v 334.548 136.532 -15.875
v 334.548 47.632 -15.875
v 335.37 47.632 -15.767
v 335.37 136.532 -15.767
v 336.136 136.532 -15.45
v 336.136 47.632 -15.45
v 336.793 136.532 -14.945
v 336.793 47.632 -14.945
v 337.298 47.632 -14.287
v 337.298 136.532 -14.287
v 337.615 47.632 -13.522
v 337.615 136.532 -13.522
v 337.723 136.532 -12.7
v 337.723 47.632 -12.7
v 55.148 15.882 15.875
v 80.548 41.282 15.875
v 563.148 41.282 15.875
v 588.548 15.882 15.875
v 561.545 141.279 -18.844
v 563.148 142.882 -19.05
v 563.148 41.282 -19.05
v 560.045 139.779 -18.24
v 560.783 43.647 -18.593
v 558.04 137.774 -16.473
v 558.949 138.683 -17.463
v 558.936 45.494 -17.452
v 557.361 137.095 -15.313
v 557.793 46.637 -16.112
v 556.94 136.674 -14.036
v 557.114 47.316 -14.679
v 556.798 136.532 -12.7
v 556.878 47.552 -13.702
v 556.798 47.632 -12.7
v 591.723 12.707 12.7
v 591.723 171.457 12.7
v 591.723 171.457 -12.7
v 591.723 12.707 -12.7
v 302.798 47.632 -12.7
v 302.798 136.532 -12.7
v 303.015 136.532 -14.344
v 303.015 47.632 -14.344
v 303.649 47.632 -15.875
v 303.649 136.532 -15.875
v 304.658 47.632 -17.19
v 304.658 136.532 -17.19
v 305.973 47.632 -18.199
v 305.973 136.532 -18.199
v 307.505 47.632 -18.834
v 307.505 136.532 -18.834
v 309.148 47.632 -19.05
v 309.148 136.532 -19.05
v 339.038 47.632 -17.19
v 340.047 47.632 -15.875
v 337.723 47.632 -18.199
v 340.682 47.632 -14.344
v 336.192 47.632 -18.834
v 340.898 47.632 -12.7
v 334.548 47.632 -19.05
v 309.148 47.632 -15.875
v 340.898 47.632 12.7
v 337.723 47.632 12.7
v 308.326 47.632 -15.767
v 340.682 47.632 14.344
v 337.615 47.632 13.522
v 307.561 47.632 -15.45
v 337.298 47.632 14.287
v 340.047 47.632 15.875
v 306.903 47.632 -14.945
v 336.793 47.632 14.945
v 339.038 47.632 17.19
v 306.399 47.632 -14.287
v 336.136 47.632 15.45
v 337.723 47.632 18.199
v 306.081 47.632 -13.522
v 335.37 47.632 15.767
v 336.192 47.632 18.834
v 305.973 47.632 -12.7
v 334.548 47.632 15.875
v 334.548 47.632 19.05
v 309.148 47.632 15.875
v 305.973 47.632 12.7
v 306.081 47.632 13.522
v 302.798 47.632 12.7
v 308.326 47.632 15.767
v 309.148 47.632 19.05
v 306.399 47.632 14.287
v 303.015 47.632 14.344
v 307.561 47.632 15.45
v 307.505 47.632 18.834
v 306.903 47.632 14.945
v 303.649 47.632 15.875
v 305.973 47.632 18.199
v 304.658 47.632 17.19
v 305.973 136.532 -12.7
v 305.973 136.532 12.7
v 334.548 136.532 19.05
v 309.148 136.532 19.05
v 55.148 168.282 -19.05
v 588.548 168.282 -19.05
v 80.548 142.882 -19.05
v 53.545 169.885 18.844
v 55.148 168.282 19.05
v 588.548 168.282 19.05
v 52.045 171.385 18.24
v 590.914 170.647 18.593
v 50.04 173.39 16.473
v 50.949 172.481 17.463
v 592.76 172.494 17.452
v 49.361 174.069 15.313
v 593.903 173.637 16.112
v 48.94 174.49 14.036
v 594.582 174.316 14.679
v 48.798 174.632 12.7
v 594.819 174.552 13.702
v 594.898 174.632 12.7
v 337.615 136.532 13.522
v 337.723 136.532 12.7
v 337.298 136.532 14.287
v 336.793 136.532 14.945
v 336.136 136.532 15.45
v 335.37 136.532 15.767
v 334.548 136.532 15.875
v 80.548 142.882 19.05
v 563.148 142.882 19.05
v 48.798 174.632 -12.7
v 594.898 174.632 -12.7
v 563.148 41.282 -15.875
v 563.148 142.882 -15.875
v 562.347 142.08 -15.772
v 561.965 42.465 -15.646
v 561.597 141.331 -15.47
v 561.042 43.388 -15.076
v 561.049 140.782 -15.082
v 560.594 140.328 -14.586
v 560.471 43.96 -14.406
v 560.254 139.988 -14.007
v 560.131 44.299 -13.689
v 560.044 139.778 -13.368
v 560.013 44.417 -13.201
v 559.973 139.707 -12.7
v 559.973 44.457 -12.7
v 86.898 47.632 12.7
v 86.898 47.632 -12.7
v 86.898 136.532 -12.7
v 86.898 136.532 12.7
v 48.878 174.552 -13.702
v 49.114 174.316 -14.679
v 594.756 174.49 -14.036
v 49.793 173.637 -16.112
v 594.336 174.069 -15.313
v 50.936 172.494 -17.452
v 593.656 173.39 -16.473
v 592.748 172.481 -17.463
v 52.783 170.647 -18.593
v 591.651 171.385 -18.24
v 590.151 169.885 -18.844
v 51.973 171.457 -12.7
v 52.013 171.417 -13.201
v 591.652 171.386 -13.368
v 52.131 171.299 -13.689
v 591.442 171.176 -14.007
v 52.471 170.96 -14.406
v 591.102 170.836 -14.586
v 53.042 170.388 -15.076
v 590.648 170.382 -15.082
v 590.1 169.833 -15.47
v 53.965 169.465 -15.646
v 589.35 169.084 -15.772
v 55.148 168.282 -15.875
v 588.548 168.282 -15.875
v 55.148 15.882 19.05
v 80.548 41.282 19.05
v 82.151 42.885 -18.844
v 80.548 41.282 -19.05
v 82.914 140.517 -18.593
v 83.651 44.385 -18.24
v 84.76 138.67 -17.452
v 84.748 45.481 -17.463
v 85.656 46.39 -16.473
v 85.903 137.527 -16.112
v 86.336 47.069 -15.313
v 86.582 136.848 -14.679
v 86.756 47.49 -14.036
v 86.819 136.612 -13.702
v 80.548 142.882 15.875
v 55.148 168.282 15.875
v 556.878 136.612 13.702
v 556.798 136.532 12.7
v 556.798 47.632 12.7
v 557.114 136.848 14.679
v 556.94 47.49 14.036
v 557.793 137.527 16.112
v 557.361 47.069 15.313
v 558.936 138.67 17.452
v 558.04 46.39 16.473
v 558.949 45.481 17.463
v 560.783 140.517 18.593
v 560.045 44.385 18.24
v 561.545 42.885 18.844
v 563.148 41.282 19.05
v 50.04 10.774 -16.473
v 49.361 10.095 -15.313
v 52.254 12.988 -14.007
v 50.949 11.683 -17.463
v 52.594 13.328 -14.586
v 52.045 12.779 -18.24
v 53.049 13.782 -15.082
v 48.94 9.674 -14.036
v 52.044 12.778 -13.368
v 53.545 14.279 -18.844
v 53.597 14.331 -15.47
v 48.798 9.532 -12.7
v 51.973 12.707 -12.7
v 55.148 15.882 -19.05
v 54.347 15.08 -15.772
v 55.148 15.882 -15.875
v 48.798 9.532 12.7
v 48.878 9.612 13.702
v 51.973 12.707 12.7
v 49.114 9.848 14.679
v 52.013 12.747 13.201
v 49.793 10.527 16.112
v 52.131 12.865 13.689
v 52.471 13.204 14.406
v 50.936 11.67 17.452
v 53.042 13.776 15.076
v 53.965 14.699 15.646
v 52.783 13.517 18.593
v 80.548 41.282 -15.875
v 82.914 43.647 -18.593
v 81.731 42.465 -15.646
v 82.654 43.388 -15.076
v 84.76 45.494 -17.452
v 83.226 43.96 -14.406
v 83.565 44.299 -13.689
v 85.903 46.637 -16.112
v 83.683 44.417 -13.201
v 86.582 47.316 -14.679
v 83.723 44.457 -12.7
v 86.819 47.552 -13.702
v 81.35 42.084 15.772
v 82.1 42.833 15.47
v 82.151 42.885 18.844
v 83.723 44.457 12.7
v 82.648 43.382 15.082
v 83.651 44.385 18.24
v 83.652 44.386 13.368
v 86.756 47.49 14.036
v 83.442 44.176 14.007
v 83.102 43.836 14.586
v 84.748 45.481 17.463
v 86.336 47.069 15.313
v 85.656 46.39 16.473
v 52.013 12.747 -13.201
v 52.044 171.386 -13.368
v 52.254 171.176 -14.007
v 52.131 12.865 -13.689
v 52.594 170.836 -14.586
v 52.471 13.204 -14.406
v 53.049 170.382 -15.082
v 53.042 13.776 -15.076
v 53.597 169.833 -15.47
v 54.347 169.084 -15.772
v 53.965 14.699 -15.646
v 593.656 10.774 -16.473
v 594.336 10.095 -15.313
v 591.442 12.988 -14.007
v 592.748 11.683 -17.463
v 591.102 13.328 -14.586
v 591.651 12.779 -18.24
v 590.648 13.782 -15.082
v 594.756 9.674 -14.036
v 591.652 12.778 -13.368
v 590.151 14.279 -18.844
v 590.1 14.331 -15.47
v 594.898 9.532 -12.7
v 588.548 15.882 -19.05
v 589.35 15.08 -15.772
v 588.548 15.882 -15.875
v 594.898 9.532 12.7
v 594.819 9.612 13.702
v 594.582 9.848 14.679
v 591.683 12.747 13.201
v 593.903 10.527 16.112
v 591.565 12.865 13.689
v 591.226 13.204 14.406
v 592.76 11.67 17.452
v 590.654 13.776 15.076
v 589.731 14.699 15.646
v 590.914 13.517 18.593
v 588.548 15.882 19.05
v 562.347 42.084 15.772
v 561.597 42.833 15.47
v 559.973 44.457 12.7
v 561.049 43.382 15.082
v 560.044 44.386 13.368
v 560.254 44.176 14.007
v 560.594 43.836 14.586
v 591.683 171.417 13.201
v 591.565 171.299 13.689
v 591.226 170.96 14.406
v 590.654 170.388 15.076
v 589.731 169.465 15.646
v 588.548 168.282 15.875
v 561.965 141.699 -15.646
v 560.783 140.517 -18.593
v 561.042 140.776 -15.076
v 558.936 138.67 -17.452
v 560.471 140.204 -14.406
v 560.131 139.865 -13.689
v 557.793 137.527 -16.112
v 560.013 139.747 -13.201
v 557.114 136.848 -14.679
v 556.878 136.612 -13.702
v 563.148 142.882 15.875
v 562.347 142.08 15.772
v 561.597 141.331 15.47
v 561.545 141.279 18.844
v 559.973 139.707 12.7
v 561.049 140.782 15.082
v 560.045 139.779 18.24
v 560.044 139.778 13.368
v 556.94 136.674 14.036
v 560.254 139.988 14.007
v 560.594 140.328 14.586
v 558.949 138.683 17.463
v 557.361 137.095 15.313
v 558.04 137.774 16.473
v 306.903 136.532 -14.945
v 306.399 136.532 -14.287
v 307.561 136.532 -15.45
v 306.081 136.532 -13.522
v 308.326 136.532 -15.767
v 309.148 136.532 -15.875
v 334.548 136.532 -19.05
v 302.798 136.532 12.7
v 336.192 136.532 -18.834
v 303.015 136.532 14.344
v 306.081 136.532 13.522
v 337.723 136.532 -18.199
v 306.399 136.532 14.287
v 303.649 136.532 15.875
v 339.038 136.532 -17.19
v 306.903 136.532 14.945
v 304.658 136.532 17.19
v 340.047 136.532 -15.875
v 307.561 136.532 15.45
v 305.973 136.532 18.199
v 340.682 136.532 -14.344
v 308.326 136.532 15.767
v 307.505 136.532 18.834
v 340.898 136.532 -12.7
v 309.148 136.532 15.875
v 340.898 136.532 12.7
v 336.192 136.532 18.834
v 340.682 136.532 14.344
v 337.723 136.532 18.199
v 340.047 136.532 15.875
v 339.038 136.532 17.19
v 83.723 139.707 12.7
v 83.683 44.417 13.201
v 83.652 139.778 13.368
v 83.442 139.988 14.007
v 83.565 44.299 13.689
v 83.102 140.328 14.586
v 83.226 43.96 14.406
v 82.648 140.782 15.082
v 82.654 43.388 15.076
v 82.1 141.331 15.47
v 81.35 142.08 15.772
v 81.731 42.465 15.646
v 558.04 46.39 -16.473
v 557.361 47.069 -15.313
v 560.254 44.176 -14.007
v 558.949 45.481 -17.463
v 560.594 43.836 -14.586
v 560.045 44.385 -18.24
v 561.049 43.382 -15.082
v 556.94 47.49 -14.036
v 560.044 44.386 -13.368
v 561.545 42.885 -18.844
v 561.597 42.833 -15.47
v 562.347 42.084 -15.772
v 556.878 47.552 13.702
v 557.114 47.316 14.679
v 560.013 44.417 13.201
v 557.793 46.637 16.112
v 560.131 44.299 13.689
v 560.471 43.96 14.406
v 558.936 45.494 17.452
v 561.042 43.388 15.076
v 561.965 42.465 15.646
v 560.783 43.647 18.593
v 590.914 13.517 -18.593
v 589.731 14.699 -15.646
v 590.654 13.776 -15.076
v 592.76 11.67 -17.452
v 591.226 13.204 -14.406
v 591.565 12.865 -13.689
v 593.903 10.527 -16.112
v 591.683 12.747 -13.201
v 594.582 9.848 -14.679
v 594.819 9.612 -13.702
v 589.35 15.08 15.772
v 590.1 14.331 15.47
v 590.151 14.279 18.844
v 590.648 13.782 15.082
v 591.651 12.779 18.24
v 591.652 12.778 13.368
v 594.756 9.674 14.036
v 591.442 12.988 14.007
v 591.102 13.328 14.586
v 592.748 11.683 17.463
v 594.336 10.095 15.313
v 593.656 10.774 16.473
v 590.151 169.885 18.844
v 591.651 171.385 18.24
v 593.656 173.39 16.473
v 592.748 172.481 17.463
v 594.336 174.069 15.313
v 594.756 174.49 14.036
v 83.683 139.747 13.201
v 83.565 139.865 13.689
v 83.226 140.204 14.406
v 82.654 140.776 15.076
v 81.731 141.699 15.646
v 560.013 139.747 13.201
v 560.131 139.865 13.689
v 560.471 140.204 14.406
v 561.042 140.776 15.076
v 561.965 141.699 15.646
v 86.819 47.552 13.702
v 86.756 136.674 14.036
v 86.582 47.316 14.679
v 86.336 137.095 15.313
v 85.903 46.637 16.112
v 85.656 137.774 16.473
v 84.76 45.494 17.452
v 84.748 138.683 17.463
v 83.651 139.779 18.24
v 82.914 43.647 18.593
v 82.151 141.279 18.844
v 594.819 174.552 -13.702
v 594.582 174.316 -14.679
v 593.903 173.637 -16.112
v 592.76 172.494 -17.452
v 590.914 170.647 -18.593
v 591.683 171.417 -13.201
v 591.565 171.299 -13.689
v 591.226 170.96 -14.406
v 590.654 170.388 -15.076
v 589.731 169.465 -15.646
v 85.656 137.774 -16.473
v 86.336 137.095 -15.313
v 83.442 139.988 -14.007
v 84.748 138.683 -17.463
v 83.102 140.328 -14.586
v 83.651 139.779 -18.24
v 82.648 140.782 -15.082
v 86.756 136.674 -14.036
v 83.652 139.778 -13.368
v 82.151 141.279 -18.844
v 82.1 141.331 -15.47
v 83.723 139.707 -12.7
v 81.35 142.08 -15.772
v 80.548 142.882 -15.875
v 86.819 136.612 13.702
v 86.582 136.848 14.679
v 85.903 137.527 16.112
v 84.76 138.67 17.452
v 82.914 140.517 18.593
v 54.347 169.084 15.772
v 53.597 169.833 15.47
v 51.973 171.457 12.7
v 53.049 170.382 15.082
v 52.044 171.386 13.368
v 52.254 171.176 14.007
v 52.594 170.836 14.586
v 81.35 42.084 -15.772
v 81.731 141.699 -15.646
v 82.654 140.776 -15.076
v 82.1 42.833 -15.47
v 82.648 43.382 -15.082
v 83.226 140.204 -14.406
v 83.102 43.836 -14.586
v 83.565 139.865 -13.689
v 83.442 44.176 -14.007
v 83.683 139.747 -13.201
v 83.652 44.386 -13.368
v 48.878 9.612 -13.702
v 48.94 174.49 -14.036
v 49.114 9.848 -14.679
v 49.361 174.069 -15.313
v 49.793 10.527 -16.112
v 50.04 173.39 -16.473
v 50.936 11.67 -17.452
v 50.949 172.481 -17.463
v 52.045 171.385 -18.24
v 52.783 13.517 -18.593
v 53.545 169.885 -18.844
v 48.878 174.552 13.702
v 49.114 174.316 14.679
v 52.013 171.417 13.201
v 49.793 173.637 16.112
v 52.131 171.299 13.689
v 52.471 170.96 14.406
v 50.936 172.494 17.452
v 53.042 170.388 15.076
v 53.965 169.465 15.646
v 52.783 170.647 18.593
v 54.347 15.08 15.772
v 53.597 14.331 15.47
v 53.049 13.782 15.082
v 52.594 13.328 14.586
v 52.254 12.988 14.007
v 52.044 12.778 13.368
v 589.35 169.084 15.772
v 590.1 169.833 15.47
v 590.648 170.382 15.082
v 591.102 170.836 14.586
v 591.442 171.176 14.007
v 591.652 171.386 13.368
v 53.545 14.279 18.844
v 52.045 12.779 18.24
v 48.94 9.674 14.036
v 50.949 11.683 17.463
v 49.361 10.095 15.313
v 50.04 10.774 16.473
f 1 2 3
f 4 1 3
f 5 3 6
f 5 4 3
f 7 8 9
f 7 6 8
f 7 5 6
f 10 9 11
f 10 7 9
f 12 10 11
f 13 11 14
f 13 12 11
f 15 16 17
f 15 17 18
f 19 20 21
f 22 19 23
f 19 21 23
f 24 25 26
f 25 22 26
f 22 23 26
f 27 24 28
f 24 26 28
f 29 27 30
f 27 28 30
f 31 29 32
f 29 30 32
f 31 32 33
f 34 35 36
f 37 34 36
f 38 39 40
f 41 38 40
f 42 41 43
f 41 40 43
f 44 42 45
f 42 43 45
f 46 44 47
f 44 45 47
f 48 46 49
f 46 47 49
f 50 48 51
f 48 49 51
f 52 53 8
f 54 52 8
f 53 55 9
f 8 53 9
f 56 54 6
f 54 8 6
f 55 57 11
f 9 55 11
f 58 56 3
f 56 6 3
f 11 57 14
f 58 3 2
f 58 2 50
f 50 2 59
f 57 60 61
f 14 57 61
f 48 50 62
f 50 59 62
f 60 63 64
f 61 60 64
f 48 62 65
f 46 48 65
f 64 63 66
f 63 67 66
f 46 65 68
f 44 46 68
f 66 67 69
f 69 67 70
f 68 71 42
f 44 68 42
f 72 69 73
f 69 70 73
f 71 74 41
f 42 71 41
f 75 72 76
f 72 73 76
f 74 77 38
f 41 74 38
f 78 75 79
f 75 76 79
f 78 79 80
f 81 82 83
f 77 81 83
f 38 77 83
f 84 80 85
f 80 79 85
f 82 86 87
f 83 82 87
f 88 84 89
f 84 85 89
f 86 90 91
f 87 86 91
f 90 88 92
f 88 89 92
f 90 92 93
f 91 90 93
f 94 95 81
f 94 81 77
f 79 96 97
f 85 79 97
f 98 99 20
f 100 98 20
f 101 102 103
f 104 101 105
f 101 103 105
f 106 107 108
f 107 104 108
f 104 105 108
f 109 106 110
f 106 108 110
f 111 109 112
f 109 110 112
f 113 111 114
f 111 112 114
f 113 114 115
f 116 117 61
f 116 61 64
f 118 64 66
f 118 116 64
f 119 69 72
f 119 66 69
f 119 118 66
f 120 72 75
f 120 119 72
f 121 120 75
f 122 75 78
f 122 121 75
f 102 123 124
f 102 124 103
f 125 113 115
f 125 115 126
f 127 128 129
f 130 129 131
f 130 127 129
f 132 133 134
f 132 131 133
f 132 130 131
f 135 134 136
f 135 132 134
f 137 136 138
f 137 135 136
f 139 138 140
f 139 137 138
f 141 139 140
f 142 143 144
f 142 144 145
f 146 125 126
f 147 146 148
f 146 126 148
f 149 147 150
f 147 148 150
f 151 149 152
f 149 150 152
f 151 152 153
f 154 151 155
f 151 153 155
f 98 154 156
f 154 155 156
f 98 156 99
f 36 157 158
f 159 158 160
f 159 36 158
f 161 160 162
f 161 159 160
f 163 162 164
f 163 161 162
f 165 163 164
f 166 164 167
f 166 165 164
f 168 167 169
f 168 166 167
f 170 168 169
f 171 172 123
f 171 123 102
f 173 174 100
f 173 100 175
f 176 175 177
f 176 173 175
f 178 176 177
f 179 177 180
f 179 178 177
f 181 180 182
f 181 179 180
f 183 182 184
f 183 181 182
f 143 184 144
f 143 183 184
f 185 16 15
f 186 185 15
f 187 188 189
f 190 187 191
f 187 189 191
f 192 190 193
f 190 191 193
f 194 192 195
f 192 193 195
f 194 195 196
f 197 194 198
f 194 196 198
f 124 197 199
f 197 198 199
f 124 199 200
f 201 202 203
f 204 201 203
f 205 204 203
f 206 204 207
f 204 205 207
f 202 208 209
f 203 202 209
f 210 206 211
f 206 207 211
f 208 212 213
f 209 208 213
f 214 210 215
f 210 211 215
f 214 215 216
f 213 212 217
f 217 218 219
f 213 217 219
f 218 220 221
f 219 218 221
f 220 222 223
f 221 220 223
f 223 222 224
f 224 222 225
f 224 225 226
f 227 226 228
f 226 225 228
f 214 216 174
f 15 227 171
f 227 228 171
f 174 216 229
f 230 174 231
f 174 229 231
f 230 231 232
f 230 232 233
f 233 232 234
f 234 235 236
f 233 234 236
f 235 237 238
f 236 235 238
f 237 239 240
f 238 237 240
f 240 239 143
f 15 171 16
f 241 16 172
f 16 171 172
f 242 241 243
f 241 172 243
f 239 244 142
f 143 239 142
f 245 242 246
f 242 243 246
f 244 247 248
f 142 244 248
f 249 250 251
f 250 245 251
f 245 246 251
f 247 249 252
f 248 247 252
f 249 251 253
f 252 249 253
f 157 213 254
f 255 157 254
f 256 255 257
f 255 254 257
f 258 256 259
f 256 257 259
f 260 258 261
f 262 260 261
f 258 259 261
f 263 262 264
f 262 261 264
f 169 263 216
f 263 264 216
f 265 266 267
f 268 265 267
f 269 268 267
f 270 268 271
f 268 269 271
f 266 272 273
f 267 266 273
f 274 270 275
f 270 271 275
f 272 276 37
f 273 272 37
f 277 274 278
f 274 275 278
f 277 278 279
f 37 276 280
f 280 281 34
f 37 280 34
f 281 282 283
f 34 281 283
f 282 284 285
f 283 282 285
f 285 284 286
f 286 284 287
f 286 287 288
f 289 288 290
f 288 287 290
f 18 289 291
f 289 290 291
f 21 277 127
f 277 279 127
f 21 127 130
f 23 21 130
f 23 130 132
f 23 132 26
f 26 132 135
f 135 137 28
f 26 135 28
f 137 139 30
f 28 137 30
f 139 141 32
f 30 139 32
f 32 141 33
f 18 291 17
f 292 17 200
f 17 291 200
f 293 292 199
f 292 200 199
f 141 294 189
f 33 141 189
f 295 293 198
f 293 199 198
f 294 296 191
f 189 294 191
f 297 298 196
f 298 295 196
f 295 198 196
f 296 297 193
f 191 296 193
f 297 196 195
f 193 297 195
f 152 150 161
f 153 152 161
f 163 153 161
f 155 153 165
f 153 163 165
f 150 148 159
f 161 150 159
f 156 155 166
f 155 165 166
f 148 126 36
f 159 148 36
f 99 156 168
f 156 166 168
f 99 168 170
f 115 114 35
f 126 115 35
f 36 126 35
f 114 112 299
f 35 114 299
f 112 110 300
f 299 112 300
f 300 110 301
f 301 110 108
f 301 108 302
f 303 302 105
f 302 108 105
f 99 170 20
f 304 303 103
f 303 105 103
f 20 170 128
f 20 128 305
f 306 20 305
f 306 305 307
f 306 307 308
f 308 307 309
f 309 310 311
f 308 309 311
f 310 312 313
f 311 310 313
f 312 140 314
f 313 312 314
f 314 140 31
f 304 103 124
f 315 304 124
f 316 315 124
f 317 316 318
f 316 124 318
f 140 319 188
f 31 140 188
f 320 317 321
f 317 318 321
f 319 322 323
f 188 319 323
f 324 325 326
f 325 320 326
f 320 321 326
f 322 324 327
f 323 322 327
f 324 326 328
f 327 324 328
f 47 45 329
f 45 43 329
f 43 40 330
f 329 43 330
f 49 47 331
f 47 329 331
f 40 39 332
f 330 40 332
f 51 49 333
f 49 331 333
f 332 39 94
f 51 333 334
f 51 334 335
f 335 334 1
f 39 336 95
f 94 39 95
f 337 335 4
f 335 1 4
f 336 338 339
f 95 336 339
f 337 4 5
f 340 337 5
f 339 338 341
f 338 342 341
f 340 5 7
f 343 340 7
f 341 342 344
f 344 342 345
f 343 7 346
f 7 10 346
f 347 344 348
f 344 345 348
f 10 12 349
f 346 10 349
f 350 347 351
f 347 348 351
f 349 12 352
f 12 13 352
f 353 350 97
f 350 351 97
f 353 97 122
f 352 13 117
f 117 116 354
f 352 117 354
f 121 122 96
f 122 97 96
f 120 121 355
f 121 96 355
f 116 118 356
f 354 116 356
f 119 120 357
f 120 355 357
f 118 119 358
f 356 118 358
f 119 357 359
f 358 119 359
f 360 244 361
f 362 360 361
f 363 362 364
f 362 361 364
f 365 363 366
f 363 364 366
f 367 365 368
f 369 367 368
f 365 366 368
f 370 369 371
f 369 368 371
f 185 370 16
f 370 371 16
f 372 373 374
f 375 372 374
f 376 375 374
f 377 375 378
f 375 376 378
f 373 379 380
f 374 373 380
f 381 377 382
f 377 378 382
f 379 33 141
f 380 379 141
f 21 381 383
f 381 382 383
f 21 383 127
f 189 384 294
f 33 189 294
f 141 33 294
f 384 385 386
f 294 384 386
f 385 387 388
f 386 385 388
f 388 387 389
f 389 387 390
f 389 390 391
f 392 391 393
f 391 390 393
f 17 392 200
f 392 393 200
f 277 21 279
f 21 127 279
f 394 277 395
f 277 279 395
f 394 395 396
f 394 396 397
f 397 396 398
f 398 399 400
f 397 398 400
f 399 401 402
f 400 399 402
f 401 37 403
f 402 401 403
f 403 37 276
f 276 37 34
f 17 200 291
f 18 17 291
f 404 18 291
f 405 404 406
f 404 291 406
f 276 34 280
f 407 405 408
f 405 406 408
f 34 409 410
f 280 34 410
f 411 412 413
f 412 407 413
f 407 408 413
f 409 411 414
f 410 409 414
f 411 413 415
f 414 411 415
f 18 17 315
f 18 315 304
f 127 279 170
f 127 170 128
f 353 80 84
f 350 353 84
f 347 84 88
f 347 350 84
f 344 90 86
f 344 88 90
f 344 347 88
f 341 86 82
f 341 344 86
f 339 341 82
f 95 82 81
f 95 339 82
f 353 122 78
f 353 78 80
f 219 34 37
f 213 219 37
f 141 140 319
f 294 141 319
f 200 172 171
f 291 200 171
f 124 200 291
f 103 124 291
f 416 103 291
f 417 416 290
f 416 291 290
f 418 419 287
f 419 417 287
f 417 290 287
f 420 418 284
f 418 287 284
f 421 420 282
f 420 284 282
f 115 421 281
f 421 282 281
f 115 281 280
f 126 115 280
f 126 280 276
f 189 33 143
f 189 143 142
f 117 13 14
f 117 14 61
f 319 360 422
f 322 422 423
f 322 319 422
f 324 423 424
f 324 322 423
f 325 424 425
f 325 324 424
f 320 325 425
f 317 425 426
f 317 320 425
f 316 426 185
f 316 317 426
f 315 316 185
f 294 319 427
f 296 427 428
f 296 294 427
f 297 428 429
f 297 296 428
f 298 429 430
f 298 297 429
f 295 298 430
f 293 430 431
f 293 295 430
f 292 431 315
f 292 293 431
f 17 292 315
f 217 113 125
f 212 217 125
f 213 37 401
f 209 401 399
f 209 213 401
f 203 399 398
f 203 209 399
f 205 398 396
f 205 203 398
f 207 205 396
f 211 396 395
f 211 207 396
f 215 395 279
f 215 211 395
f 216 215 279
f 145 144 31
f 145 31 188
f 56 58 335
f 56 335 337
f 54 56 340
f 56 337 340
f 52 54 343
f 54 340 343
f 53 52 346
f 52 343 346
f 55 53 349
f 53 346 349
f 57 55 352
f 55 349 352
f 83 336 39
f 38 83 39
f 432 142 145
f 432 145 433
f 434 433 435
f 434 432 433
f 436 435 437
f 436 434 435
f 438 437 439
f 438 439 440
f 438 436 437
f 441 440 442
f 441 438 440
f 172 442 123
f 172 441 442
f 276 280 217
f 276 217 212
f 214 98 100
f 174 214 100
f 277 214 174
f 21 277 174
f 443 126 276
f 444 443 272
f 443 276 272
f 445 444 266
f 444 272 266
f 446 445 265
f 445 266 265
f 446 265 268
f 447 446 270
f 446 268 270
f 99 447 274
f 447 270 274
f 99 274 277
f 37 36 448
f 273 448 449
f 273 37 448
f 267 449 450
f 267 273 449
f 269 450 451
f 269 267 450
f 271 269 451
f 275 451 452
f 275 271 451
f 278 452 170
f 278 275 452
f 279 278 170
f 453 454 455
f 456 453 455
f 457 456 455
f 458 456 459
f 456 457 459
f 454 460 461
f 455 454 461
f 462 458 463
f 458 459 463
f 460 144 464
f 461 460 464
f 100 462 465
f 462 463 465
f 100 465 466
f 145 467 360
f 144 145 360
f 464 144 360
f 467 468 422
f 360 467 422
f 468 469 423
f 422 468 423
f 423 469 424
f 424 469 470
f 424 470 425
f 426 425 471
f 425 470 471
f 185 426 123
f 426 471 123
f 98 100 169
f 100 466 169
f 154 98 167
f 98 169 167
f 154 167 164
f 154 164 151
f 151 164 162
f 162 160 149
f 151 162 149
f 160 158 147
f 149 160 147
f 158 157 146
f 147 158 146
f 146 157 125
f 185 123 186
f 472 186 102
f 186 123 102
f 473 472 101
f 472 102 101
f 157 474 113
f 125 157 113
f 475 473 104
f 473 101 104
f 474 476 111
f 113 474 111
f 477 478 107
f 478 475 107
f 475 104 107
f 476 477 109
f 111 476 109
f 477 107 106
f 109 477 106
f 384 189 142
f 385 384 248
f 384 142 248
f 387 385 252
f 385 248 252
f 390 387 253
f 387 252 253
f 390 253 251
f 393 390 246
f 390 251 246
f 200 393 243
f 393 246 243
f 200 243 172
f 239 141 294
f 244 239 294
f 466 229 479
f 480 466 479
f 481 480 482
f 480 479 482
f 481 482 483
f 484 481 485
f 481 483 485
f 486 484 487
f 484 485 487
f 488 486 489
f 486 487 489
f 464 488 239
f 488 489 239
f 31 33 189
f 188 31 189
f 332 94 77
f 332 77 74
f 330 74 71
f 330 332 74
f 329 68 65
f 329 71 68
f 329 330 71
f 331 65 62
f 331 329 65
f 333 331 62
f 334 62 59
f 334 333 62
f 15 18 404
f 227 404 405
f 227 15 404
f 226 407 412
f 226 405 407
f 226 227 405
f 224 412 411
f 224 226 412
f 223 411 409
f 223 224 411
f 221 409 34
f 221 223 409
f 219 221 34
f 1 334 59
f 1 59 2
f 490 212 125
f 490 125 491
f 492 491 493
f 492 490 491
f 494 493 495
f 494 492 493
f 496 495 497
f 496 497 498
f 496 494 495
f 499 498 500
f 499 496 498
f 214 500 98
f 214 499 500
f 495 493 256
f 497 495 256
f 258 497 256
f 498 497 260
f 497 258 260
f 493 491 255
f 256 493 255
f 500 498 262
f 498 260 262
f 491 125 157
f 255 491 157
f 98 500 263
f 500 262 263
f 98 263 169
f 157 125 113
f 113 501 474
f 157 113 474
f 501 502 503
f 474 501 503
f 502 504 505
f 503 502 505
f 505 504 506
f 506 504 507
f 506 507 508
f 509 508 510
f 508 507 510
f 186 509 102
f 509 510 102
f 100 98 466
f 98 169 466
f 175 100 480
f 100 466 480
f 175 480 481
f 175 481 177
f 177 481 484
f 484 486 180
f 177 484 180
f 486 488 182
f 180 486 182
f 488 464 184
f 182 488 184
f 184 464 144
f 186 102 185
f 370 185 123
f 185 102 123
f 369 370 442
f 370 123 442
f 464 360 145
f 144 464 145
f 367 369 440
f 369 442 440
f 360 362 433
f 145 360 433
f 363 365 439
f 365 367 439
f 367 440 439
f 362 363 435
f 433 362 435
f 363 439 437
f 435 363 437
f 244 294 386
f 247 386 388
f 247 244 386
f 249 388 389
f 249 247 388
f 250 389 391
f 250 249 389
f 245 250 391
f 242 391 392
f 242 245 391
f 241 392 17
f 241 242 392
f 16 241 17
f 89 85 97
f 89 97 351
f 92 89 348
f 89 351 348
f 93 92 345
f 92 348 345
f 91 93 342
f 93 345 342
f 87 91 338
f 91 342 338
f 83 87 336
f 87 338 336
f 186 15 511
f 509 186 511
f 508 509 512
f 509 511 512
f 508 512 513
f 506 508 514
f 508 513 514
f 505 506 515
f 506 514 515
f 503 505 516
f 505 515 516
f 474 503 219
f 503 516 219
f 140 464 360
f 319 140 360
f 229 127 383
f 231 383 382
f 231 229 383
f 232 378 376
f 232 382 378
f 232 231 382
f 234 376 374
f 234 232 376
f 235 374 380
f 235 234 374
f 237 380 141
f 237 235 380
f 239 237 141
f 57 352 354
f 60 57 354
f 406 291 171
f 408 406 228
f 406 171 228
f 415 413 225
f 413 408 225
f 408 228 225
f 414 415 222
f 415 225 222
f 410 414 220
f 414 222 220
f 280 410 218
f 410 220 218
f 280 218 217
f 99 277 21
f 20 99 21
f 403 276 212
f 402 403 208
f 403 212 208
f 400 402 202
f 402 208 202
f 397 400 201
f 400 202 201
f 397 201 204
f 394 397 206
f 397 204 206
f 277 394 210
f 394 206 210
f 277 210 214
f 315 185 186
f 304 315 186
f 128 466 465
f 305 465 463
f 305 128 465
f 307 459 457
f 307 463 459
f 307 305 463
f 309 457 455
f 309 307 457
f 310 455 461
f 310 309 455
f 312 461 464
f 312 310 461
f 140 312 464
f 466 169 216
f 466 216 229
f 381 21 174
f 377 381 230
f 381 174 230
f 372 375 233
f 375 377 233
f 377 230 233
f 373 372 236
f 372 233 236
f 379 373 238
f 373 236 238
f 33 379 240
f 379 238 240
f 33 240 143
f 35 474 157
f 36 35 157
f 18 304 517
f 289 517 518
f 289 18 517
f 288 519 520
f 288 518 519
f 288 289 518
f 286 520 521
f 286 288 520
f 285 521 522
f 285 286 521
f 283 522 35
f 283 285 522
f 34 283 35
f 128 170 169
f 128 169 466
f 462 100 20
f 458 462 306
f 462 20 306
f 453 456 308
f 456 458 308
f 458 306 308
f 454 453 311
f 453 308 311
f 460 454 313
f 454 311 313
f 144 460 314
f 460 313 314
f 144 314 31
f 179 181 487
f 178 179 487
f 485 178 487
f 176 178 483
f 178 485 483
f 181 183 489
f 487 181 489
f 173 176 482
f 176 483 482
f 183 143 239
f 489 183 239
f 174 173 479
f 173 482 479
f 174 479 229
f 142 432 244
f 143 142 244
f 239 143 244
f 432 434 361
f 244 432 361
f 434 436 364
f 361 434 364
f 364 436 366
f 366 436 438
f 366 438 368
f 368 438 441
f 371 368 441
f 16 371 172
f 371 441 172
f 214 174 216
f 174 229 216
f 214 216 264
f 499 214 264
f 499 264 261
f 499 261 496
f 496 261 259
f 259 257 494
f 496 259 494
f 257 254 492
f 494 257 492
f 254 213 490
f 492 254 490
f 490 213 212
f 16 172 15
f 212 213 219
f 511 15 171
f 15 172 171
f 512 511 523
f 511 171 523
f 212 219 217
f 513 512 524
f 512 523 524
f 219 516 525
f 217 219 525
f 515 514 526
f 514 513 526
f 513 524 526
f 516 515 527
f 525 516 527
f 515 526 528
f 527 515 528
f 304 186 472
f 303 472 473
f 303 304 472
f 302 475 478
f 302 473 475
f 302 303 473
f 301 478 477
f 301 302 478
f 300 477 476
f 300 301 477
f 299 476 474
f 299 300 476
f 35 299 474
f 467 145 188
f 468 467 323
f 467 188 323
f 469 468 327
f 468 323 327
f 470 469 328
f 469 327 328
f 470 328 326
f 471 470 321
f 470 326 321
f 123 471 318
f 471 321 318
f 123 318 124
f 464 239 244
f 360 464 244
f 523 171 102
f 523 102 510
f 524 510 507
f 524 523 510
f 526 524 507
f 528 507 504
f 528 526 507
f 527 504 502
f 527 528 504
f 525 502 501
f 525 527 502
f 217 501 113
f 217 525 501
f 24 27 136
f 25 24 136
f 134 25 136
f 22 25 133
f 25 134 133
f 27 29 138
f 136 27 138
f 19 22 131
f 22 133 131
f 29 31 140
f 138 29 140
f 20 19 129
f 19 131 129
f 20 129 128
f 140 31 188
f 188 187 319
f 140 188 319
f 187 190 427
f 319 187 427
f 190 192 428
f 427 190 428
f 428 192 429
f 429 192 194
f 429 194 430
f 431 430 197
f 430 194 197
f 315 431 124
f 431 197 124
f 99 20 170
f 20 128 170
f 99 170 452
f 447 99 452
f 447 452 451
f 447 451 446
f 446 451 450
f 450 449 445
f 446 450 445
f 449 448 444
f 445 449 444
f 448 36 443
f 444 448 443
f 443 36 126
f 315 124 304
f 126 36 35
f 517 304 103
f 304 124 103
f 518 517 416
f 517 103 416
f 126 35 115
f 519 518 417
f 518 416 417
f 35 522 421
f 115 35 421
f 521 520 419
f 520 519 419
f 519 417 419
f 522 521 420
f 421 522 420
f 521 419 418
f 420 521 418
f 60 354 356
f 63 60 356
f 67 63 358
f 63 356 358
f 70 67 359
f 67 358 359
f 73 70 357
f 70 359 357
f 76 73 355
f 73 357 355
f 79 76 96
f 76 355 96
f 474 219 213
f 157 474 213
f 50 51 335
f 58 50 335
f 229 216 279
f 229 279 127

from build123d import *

# Parameters (mm, degrees)
STRUCTURAL_MEMBER1_DEPTH      = 154.940768363
STRUCTURAL_MEMBER1_DEPTH_BACK = 27.940768363
STRUCTURAL_MEMBER1_2_DEPTH    = 563.881536726
STRUCTURAL_MEMBER1_3_DEPTH    = 182.881536726
STRUCTURAL_MEMBER1_4_DEPTH    = 563.881536726
STRUCTURAL_MEMBER1_5_DEPTH    = 129


with BuildPart() as part:
    # Sketch1 → Structural Member1 (new, two sides)
    with BuildSketch(Plane(origin=(67.848170594, 155.581975946, 0), x_dir=(1, 0, 0), z_dir=(0, -1, 0))) as structural_member1_sk:
        with BuildLine():
            Line((-12.7, -19.05), (12.7, -19.05))
            ThreePointArc((12.7, -19.05), (17.190128061, -17.190128061), (19.05, -12.7))
            Line((19.05, -12.7), (19.05, 12.7))
            ThreePointArc((19.05, 12.7), (17.190128061, 17.190128061), (12.7, 19.05))
            Line((12.7, 19.05), (-12.7, 19.05))
            ThreePointArc((-12.7, 19.05), (-17.190128061, 17.190128061), (-19.05, 12.7))
            Line((-19.05, 12.7), (-19.05, -12.7))
            ThreePointArc((-19.05, -12.7), (-17.190128061, -17.190128061), (-12.7, -19.05))
        make_face()
        with BuildLine():
            Line((-12.7, -15.875), (12.7, -15.875))
            ThreePointArc((12.7, -15.875), (14.94506403, -14.94506403), (15.875, -12.7))
            Line((15.875, -12.7), (15.875, 12.7))
            ThreePointArc((15.875, 12.7), (14.94506403, 14.94506403), (12.7, 15.875))
            Line((12.7, 15.875), (-12.7, 15.875))
            ThreePointArc((-12.7, 15.875), (-14.94506403, 14.94506403), (-15.875, 12.7))
            Line((-15.875, 12.7), (-15.875, -12.7))
            ThreePointArc((-15.875, -12.7), (-14.94506403, -14.94506403), (-12.7, -15.875))
        make_face(mode=Mode.SUBTRACT)
    extrude(amount=STRUCTURAL_MEMBER1_DEPTH)
    extrude(structural_member1_sk.sketch, amount=-STRUCTURAL_MEMBER1_DEPTH_BACK)

    # Structural Member1 mitre 1
    split(bisect_by=Plane(origin=(67.848170594, 155.581975946, 0), x_dir=(0.707106781, -0.707106781, 0), z_dir=(-0.707106781, -0.707106781, 0)), keep=Keep.TOP)

    # Structural Member1 mitre 2
    split(bisect_by=Plane(origin=(67.848170594, 28.581975946, 0), x_dir=(-0.707106781, -0.707106781, 0), z_dir=(-0.707106781, 0.707106781, 0)), keep=Keep.TOP)


with BuildPart() as body_2:
    # Sketch1 on segment 2 (carried to segment 2) → Structural Member1 2 (new body)
    with BuildSketch(Plane(origin=(39.907402231, 28.581975946, 0), x_dir=(0, 1, 0), z_dir=(1, 0, 0))):
        with BuildLine():
            Line((-12.7, -19.05), (12.7, -19.05))
            ThreePointArc((12.7, -19.05), (17.190128061, -17.190128061), (19.05, -12.7))
            Line((19.05, -12.7), (19.05, 12.7))
            ThreePointArc((19.05, 12.7), (17.190128061, 17.190128061), (12.7, 19.05))
            Line((12.7, 19.05), (-12.7, 19.05))
            ThreePointArc((-12.7, 19.05), (-17.190128061, 17.190128061), (-19.05, 12.7))
            Line((-19.05, 12.7), (-19.05, -12.7))
            ThreePointArc((-19.05, -12.7), (-17.190128061, -17.190128061), (-12.7, -19.05))
        make_face()
        with BuildLine():
            Line((-12.7, -15.875), (12.7, -15.875))
            ThreePointArc((12.7, -15.875), (14.94506403, -14.94506403), (15.875, -12.7))
            Line((15.875, -12.7), (15.875, 12.7))
            ThreePointArc((15.875, 12.7), (14.94506403, 14.94506403), (12.7, 15.875))
            Line((12.7, 15.875), (-12.7, 15.875))
            ThreePointArc((-12.7, 15.875), (-14.94506403, 14.94506403), (-15.875, 12.7))
            Line((-15.875, 12.7), (-15.875, -12.7))
            ThreePointArc((-15.875, -12.7), (-14.94506403, -14.94506403), (-12.7, -15.875))
        make_face(mode=Mode.SUBTRACT)
    extrude(amount=STRUCTURAL_MEMBER1_2_DEPTH)

    # Structural Member1 2 mitre 1
    split(bisect_by=Plane(origin=(67.848170594, 28.581975946, 0), x_dir=(0.707106781, 0.707106781, 0), z_dir=(0.707106781, -0.707106781, 0)), keep=Keep.TOP)

    # Structural Member1 2 mitre 2
    split(bisect_by=Plane(origin=(575.848170594, 28.581975946, 0), x_dir=(0.707106781, -0.707106781, 0), z_dir=(-0.707106781, -0.707106781, 0)), keep=Keep.TOP)


with BuildPart() as body_3:
    # Sketch1 on segment 3 (carried to segment 3) → Structural Member1 3 (new body)
    with BuildSketch(Plane(origin=(575.848170594, 0.641207582, 0), x_dir=(-1, 0, 0), z_dir=(0, 1, 0))):
        with BuildLine():
            Line((-12.7, -19.05), (12.7, -19.05))
            ThreePointArc((12.7, -19.05), (17.190128061, -17.190128061), (19.05, -12.7))
            Line((19.05, -12.7), (19.05, 12.7))
            ThreePointArc((19.05, 12.7), (17.190128061, 17.190128061), (12.7, 19.05))
            Line((12.7, 19.05), (-12.7, 19.05))
            ThreePointArc((-12.7, 19.05), (-17.190128061, 17.190128061), (-19.05, 12.7))
            Line((-19.05, 12.7), (-19.05, -12.7))
            ThreePointArc((-19.05, -12.7), (-17.190128061, -17.190128061), (-12.7, -19.05))
        make_face()
        with BuildLine():
            Line((-12.7, -15.875), (12.7, -15.875))
            ThreePointArc((12.7, -15.875), (14.94506403, -14.94506403), (15.875, -12.7))
            Line((15.875, -12.7), (15.875, 12.7))
            ThreePointArc((15.875, 12.7), (14.94506403, 14.94506403), (12.7, 15.875))
            Line((12.7, 15.875), (-12.7, 15.875))
            ThreePointArc((-12.7, 15.875), (-14.94506403, 14.94506403), (-15.875, 12.7))
            Line((-15.875, 12.7), (-15.875, -12.7))
            ThreePointArc((-15.875, -12.7), (-14.94506403, -14.94506403), (-12.7, -15.875))
        make_face(mode=Mode.SUBTRACT)
    extrude(amount=STRUCTURAL_MEMBER1_3_DEPTH)

    # Structural Member1 3 mitre 1
    split(bisect_by=Plane(origin=(575.848170594, 155.581975946, 0), x_dir=(0.707106781, 0.707106781, 0), z_dir=(0.707106781, -0.707106781, 0)), keep=Keep.TOP)

    # Structural Member1 3 mitre 2
    split(bisect_by=Plane(origin=(575.848170594, 28.581975946, 0), x_dir=(-0.707106781, 0.707106781, 0), z_dir=(0.707106781, 0.707106781, 0)), keep=Keep.TOP)


with BuildPart() as body_4:
    # Sketch1 on segment 4 (carried to segment 4) → Structural Member1 4 (new body)
    with BuildSketch(Plane(origin=(603.788938957, 155.581975946, 0), x_dir=(0, -1, 0), z_dir=(-1, 0, 0))):
        with BuildLine():
            Line((-12.7, -19.05), (12.7, -19.05))
            ThreePointArc((12.7, -19.05), (17.190128061, -17.190128061), (19.05, -12.7))
            Line((19.05, -12.7), (19.05, 12.7))
            ThreePointArc((19.05, 12.7), (17.190128061, 17.190128061), (12.7, 19.05))
            Line((12.7, 19.05), (-12.7, 19.05))
            ThreePointArc((-12.7, 19.05), (-17.190128061, 17.190128061), (-19.05, 12.7))
            Line((-19.05, 12.7), (-19.05, -12.7))
            ThreePointArc((-19.05, -12.7), (-17.190128061, -17.190128061), (-12.7, -19.05))
        make_face()
        with BuildLine():
            Line((-12.7, -15.875), (12.7, -15.875))
            ThreePointArc((12.7, -15.875), (14.94506403, -14.94506403), (15.875, -12.7))
            Line((15.875, -12.7), (15.875, 12.7))
            ThreePointArc((15.875, 12.7), (14.94506403, 14.94506403), (12.7, 15.875))
            Line((12.7, 15.875), (-12.7, 15.875))
            ThreePointArc((-12.7, 15.875), (-14.94506403, 14.94506403), (-15.875, 12.7))
            Line((-15.875, 12.7), (-15.875, -12.7))
            ThreePointArc((-15.875, -12.7), (-14.94506403, -14.94506403), (-12.7, -15.875))
        make_face(mode=Mode.SUBTRACT)
    extrude(amount=STRUCTURAL_MEMBER1_4_DEPTH)

    # Structural Member1 4 mitre 1
    split(bisect_by=Plane(origin=(67.848170594, 155.581975946, 0), x_dir=(-0.707106781, 0.707106781, 0), z_dir=(0.707106781, 0.707106781, 0)), keep=Keep.TOP)

    # Structural Member1 4 mitre 2
    split(bisect_by=Plane(origin=(575.848170594, 155.581975946, 0), x_dir=(-0.707106781, -0.707106781, 0), z_dir=(-0.707106781, 0.707106781, 0)), keep=Keep.TOP)


with BuildPart() as body_5:
    # Sketch1 on segment 5 (carried to segment 5) → Structural Member1 5 (new body)
    with BuildSketch(Plane(origin=(321.848170594, 156.581975946, 0), x_dir=(1, 0, 0), z_dir=(0, -1, 0))):
        with BuildLine():
            Line((-12.7, -19.05), (12.7, -19.05))
            ThreePointArc((12.7, -19.05), (17.190128061, -17.190128061), (19.05, -12.7))
            Line((19.05, -12.7), (19.05, 12.7))
            ThreePointArc((19.05, 12.7), (17.190128061, 17.190128061), (12.7, 19.05))
            Line((12.7, 19.05), (-12.7, 19.05))
            ThreePointArc((-12.7, 19.05), (-17.190128061, 17.190128061), (-19.05, 12.7))
            Line((-19.05, 12.7), (-19.05, -12.7))
            ThreePointArc((-19.05, -12.7), (-17.190128061, -17.190128061), (-12.7, -19.05))
        make_face()
        with BuildLine():
            Line((-12.7, -15.875), (12.7, -15.875))
            ThreePointArc((12.7, -15.875), (14.94506403, -14.94506403), (15.875, -12.7))
            Line((15.875, -12.7), (15.875, 12.7))
            ThreePointArc((15.875, 12.7), (14.94506403, 14.94506403), (12.7, 15.875))
            Line((12.7, 15.875), (-12.7, 15.875))
            ThreePointArc((-12.7, 15.875), (-14.94506403, 14.94506403), (-15.875, 12.7))
            Line((-15.875, 12.7), (-15.875, -12.7))
            ThreePointArc((-15.875, -12.7), (-14.94506403, -14.94506403), (-12.7, -15.875))
        make_face(mode=Mode.SUBTRACT)
    extrude(amount=STRUCTURAL_MEMBER1_5_DEPTH)

    # Structural Member1 5 mitre 1
    split(bisect_by=Plane(origin=(321.848170594, 136.531975946, 0), x_dir=(1, 0, 0), z_dir=(0, -1, 0)), keep=Keep.TOP)

    # Structural Member1 5 mitre 2
    split(bisect_by=Plane(origin=(321.848170594, 47.631975946, 0), x_dir=(-1, 0, 0), z_dir=(0, 1, 0)), keep=Keep.TOP)


solid = Compound([part.part, body_2.part, body_3.part, body_4.part, body_5.part])
